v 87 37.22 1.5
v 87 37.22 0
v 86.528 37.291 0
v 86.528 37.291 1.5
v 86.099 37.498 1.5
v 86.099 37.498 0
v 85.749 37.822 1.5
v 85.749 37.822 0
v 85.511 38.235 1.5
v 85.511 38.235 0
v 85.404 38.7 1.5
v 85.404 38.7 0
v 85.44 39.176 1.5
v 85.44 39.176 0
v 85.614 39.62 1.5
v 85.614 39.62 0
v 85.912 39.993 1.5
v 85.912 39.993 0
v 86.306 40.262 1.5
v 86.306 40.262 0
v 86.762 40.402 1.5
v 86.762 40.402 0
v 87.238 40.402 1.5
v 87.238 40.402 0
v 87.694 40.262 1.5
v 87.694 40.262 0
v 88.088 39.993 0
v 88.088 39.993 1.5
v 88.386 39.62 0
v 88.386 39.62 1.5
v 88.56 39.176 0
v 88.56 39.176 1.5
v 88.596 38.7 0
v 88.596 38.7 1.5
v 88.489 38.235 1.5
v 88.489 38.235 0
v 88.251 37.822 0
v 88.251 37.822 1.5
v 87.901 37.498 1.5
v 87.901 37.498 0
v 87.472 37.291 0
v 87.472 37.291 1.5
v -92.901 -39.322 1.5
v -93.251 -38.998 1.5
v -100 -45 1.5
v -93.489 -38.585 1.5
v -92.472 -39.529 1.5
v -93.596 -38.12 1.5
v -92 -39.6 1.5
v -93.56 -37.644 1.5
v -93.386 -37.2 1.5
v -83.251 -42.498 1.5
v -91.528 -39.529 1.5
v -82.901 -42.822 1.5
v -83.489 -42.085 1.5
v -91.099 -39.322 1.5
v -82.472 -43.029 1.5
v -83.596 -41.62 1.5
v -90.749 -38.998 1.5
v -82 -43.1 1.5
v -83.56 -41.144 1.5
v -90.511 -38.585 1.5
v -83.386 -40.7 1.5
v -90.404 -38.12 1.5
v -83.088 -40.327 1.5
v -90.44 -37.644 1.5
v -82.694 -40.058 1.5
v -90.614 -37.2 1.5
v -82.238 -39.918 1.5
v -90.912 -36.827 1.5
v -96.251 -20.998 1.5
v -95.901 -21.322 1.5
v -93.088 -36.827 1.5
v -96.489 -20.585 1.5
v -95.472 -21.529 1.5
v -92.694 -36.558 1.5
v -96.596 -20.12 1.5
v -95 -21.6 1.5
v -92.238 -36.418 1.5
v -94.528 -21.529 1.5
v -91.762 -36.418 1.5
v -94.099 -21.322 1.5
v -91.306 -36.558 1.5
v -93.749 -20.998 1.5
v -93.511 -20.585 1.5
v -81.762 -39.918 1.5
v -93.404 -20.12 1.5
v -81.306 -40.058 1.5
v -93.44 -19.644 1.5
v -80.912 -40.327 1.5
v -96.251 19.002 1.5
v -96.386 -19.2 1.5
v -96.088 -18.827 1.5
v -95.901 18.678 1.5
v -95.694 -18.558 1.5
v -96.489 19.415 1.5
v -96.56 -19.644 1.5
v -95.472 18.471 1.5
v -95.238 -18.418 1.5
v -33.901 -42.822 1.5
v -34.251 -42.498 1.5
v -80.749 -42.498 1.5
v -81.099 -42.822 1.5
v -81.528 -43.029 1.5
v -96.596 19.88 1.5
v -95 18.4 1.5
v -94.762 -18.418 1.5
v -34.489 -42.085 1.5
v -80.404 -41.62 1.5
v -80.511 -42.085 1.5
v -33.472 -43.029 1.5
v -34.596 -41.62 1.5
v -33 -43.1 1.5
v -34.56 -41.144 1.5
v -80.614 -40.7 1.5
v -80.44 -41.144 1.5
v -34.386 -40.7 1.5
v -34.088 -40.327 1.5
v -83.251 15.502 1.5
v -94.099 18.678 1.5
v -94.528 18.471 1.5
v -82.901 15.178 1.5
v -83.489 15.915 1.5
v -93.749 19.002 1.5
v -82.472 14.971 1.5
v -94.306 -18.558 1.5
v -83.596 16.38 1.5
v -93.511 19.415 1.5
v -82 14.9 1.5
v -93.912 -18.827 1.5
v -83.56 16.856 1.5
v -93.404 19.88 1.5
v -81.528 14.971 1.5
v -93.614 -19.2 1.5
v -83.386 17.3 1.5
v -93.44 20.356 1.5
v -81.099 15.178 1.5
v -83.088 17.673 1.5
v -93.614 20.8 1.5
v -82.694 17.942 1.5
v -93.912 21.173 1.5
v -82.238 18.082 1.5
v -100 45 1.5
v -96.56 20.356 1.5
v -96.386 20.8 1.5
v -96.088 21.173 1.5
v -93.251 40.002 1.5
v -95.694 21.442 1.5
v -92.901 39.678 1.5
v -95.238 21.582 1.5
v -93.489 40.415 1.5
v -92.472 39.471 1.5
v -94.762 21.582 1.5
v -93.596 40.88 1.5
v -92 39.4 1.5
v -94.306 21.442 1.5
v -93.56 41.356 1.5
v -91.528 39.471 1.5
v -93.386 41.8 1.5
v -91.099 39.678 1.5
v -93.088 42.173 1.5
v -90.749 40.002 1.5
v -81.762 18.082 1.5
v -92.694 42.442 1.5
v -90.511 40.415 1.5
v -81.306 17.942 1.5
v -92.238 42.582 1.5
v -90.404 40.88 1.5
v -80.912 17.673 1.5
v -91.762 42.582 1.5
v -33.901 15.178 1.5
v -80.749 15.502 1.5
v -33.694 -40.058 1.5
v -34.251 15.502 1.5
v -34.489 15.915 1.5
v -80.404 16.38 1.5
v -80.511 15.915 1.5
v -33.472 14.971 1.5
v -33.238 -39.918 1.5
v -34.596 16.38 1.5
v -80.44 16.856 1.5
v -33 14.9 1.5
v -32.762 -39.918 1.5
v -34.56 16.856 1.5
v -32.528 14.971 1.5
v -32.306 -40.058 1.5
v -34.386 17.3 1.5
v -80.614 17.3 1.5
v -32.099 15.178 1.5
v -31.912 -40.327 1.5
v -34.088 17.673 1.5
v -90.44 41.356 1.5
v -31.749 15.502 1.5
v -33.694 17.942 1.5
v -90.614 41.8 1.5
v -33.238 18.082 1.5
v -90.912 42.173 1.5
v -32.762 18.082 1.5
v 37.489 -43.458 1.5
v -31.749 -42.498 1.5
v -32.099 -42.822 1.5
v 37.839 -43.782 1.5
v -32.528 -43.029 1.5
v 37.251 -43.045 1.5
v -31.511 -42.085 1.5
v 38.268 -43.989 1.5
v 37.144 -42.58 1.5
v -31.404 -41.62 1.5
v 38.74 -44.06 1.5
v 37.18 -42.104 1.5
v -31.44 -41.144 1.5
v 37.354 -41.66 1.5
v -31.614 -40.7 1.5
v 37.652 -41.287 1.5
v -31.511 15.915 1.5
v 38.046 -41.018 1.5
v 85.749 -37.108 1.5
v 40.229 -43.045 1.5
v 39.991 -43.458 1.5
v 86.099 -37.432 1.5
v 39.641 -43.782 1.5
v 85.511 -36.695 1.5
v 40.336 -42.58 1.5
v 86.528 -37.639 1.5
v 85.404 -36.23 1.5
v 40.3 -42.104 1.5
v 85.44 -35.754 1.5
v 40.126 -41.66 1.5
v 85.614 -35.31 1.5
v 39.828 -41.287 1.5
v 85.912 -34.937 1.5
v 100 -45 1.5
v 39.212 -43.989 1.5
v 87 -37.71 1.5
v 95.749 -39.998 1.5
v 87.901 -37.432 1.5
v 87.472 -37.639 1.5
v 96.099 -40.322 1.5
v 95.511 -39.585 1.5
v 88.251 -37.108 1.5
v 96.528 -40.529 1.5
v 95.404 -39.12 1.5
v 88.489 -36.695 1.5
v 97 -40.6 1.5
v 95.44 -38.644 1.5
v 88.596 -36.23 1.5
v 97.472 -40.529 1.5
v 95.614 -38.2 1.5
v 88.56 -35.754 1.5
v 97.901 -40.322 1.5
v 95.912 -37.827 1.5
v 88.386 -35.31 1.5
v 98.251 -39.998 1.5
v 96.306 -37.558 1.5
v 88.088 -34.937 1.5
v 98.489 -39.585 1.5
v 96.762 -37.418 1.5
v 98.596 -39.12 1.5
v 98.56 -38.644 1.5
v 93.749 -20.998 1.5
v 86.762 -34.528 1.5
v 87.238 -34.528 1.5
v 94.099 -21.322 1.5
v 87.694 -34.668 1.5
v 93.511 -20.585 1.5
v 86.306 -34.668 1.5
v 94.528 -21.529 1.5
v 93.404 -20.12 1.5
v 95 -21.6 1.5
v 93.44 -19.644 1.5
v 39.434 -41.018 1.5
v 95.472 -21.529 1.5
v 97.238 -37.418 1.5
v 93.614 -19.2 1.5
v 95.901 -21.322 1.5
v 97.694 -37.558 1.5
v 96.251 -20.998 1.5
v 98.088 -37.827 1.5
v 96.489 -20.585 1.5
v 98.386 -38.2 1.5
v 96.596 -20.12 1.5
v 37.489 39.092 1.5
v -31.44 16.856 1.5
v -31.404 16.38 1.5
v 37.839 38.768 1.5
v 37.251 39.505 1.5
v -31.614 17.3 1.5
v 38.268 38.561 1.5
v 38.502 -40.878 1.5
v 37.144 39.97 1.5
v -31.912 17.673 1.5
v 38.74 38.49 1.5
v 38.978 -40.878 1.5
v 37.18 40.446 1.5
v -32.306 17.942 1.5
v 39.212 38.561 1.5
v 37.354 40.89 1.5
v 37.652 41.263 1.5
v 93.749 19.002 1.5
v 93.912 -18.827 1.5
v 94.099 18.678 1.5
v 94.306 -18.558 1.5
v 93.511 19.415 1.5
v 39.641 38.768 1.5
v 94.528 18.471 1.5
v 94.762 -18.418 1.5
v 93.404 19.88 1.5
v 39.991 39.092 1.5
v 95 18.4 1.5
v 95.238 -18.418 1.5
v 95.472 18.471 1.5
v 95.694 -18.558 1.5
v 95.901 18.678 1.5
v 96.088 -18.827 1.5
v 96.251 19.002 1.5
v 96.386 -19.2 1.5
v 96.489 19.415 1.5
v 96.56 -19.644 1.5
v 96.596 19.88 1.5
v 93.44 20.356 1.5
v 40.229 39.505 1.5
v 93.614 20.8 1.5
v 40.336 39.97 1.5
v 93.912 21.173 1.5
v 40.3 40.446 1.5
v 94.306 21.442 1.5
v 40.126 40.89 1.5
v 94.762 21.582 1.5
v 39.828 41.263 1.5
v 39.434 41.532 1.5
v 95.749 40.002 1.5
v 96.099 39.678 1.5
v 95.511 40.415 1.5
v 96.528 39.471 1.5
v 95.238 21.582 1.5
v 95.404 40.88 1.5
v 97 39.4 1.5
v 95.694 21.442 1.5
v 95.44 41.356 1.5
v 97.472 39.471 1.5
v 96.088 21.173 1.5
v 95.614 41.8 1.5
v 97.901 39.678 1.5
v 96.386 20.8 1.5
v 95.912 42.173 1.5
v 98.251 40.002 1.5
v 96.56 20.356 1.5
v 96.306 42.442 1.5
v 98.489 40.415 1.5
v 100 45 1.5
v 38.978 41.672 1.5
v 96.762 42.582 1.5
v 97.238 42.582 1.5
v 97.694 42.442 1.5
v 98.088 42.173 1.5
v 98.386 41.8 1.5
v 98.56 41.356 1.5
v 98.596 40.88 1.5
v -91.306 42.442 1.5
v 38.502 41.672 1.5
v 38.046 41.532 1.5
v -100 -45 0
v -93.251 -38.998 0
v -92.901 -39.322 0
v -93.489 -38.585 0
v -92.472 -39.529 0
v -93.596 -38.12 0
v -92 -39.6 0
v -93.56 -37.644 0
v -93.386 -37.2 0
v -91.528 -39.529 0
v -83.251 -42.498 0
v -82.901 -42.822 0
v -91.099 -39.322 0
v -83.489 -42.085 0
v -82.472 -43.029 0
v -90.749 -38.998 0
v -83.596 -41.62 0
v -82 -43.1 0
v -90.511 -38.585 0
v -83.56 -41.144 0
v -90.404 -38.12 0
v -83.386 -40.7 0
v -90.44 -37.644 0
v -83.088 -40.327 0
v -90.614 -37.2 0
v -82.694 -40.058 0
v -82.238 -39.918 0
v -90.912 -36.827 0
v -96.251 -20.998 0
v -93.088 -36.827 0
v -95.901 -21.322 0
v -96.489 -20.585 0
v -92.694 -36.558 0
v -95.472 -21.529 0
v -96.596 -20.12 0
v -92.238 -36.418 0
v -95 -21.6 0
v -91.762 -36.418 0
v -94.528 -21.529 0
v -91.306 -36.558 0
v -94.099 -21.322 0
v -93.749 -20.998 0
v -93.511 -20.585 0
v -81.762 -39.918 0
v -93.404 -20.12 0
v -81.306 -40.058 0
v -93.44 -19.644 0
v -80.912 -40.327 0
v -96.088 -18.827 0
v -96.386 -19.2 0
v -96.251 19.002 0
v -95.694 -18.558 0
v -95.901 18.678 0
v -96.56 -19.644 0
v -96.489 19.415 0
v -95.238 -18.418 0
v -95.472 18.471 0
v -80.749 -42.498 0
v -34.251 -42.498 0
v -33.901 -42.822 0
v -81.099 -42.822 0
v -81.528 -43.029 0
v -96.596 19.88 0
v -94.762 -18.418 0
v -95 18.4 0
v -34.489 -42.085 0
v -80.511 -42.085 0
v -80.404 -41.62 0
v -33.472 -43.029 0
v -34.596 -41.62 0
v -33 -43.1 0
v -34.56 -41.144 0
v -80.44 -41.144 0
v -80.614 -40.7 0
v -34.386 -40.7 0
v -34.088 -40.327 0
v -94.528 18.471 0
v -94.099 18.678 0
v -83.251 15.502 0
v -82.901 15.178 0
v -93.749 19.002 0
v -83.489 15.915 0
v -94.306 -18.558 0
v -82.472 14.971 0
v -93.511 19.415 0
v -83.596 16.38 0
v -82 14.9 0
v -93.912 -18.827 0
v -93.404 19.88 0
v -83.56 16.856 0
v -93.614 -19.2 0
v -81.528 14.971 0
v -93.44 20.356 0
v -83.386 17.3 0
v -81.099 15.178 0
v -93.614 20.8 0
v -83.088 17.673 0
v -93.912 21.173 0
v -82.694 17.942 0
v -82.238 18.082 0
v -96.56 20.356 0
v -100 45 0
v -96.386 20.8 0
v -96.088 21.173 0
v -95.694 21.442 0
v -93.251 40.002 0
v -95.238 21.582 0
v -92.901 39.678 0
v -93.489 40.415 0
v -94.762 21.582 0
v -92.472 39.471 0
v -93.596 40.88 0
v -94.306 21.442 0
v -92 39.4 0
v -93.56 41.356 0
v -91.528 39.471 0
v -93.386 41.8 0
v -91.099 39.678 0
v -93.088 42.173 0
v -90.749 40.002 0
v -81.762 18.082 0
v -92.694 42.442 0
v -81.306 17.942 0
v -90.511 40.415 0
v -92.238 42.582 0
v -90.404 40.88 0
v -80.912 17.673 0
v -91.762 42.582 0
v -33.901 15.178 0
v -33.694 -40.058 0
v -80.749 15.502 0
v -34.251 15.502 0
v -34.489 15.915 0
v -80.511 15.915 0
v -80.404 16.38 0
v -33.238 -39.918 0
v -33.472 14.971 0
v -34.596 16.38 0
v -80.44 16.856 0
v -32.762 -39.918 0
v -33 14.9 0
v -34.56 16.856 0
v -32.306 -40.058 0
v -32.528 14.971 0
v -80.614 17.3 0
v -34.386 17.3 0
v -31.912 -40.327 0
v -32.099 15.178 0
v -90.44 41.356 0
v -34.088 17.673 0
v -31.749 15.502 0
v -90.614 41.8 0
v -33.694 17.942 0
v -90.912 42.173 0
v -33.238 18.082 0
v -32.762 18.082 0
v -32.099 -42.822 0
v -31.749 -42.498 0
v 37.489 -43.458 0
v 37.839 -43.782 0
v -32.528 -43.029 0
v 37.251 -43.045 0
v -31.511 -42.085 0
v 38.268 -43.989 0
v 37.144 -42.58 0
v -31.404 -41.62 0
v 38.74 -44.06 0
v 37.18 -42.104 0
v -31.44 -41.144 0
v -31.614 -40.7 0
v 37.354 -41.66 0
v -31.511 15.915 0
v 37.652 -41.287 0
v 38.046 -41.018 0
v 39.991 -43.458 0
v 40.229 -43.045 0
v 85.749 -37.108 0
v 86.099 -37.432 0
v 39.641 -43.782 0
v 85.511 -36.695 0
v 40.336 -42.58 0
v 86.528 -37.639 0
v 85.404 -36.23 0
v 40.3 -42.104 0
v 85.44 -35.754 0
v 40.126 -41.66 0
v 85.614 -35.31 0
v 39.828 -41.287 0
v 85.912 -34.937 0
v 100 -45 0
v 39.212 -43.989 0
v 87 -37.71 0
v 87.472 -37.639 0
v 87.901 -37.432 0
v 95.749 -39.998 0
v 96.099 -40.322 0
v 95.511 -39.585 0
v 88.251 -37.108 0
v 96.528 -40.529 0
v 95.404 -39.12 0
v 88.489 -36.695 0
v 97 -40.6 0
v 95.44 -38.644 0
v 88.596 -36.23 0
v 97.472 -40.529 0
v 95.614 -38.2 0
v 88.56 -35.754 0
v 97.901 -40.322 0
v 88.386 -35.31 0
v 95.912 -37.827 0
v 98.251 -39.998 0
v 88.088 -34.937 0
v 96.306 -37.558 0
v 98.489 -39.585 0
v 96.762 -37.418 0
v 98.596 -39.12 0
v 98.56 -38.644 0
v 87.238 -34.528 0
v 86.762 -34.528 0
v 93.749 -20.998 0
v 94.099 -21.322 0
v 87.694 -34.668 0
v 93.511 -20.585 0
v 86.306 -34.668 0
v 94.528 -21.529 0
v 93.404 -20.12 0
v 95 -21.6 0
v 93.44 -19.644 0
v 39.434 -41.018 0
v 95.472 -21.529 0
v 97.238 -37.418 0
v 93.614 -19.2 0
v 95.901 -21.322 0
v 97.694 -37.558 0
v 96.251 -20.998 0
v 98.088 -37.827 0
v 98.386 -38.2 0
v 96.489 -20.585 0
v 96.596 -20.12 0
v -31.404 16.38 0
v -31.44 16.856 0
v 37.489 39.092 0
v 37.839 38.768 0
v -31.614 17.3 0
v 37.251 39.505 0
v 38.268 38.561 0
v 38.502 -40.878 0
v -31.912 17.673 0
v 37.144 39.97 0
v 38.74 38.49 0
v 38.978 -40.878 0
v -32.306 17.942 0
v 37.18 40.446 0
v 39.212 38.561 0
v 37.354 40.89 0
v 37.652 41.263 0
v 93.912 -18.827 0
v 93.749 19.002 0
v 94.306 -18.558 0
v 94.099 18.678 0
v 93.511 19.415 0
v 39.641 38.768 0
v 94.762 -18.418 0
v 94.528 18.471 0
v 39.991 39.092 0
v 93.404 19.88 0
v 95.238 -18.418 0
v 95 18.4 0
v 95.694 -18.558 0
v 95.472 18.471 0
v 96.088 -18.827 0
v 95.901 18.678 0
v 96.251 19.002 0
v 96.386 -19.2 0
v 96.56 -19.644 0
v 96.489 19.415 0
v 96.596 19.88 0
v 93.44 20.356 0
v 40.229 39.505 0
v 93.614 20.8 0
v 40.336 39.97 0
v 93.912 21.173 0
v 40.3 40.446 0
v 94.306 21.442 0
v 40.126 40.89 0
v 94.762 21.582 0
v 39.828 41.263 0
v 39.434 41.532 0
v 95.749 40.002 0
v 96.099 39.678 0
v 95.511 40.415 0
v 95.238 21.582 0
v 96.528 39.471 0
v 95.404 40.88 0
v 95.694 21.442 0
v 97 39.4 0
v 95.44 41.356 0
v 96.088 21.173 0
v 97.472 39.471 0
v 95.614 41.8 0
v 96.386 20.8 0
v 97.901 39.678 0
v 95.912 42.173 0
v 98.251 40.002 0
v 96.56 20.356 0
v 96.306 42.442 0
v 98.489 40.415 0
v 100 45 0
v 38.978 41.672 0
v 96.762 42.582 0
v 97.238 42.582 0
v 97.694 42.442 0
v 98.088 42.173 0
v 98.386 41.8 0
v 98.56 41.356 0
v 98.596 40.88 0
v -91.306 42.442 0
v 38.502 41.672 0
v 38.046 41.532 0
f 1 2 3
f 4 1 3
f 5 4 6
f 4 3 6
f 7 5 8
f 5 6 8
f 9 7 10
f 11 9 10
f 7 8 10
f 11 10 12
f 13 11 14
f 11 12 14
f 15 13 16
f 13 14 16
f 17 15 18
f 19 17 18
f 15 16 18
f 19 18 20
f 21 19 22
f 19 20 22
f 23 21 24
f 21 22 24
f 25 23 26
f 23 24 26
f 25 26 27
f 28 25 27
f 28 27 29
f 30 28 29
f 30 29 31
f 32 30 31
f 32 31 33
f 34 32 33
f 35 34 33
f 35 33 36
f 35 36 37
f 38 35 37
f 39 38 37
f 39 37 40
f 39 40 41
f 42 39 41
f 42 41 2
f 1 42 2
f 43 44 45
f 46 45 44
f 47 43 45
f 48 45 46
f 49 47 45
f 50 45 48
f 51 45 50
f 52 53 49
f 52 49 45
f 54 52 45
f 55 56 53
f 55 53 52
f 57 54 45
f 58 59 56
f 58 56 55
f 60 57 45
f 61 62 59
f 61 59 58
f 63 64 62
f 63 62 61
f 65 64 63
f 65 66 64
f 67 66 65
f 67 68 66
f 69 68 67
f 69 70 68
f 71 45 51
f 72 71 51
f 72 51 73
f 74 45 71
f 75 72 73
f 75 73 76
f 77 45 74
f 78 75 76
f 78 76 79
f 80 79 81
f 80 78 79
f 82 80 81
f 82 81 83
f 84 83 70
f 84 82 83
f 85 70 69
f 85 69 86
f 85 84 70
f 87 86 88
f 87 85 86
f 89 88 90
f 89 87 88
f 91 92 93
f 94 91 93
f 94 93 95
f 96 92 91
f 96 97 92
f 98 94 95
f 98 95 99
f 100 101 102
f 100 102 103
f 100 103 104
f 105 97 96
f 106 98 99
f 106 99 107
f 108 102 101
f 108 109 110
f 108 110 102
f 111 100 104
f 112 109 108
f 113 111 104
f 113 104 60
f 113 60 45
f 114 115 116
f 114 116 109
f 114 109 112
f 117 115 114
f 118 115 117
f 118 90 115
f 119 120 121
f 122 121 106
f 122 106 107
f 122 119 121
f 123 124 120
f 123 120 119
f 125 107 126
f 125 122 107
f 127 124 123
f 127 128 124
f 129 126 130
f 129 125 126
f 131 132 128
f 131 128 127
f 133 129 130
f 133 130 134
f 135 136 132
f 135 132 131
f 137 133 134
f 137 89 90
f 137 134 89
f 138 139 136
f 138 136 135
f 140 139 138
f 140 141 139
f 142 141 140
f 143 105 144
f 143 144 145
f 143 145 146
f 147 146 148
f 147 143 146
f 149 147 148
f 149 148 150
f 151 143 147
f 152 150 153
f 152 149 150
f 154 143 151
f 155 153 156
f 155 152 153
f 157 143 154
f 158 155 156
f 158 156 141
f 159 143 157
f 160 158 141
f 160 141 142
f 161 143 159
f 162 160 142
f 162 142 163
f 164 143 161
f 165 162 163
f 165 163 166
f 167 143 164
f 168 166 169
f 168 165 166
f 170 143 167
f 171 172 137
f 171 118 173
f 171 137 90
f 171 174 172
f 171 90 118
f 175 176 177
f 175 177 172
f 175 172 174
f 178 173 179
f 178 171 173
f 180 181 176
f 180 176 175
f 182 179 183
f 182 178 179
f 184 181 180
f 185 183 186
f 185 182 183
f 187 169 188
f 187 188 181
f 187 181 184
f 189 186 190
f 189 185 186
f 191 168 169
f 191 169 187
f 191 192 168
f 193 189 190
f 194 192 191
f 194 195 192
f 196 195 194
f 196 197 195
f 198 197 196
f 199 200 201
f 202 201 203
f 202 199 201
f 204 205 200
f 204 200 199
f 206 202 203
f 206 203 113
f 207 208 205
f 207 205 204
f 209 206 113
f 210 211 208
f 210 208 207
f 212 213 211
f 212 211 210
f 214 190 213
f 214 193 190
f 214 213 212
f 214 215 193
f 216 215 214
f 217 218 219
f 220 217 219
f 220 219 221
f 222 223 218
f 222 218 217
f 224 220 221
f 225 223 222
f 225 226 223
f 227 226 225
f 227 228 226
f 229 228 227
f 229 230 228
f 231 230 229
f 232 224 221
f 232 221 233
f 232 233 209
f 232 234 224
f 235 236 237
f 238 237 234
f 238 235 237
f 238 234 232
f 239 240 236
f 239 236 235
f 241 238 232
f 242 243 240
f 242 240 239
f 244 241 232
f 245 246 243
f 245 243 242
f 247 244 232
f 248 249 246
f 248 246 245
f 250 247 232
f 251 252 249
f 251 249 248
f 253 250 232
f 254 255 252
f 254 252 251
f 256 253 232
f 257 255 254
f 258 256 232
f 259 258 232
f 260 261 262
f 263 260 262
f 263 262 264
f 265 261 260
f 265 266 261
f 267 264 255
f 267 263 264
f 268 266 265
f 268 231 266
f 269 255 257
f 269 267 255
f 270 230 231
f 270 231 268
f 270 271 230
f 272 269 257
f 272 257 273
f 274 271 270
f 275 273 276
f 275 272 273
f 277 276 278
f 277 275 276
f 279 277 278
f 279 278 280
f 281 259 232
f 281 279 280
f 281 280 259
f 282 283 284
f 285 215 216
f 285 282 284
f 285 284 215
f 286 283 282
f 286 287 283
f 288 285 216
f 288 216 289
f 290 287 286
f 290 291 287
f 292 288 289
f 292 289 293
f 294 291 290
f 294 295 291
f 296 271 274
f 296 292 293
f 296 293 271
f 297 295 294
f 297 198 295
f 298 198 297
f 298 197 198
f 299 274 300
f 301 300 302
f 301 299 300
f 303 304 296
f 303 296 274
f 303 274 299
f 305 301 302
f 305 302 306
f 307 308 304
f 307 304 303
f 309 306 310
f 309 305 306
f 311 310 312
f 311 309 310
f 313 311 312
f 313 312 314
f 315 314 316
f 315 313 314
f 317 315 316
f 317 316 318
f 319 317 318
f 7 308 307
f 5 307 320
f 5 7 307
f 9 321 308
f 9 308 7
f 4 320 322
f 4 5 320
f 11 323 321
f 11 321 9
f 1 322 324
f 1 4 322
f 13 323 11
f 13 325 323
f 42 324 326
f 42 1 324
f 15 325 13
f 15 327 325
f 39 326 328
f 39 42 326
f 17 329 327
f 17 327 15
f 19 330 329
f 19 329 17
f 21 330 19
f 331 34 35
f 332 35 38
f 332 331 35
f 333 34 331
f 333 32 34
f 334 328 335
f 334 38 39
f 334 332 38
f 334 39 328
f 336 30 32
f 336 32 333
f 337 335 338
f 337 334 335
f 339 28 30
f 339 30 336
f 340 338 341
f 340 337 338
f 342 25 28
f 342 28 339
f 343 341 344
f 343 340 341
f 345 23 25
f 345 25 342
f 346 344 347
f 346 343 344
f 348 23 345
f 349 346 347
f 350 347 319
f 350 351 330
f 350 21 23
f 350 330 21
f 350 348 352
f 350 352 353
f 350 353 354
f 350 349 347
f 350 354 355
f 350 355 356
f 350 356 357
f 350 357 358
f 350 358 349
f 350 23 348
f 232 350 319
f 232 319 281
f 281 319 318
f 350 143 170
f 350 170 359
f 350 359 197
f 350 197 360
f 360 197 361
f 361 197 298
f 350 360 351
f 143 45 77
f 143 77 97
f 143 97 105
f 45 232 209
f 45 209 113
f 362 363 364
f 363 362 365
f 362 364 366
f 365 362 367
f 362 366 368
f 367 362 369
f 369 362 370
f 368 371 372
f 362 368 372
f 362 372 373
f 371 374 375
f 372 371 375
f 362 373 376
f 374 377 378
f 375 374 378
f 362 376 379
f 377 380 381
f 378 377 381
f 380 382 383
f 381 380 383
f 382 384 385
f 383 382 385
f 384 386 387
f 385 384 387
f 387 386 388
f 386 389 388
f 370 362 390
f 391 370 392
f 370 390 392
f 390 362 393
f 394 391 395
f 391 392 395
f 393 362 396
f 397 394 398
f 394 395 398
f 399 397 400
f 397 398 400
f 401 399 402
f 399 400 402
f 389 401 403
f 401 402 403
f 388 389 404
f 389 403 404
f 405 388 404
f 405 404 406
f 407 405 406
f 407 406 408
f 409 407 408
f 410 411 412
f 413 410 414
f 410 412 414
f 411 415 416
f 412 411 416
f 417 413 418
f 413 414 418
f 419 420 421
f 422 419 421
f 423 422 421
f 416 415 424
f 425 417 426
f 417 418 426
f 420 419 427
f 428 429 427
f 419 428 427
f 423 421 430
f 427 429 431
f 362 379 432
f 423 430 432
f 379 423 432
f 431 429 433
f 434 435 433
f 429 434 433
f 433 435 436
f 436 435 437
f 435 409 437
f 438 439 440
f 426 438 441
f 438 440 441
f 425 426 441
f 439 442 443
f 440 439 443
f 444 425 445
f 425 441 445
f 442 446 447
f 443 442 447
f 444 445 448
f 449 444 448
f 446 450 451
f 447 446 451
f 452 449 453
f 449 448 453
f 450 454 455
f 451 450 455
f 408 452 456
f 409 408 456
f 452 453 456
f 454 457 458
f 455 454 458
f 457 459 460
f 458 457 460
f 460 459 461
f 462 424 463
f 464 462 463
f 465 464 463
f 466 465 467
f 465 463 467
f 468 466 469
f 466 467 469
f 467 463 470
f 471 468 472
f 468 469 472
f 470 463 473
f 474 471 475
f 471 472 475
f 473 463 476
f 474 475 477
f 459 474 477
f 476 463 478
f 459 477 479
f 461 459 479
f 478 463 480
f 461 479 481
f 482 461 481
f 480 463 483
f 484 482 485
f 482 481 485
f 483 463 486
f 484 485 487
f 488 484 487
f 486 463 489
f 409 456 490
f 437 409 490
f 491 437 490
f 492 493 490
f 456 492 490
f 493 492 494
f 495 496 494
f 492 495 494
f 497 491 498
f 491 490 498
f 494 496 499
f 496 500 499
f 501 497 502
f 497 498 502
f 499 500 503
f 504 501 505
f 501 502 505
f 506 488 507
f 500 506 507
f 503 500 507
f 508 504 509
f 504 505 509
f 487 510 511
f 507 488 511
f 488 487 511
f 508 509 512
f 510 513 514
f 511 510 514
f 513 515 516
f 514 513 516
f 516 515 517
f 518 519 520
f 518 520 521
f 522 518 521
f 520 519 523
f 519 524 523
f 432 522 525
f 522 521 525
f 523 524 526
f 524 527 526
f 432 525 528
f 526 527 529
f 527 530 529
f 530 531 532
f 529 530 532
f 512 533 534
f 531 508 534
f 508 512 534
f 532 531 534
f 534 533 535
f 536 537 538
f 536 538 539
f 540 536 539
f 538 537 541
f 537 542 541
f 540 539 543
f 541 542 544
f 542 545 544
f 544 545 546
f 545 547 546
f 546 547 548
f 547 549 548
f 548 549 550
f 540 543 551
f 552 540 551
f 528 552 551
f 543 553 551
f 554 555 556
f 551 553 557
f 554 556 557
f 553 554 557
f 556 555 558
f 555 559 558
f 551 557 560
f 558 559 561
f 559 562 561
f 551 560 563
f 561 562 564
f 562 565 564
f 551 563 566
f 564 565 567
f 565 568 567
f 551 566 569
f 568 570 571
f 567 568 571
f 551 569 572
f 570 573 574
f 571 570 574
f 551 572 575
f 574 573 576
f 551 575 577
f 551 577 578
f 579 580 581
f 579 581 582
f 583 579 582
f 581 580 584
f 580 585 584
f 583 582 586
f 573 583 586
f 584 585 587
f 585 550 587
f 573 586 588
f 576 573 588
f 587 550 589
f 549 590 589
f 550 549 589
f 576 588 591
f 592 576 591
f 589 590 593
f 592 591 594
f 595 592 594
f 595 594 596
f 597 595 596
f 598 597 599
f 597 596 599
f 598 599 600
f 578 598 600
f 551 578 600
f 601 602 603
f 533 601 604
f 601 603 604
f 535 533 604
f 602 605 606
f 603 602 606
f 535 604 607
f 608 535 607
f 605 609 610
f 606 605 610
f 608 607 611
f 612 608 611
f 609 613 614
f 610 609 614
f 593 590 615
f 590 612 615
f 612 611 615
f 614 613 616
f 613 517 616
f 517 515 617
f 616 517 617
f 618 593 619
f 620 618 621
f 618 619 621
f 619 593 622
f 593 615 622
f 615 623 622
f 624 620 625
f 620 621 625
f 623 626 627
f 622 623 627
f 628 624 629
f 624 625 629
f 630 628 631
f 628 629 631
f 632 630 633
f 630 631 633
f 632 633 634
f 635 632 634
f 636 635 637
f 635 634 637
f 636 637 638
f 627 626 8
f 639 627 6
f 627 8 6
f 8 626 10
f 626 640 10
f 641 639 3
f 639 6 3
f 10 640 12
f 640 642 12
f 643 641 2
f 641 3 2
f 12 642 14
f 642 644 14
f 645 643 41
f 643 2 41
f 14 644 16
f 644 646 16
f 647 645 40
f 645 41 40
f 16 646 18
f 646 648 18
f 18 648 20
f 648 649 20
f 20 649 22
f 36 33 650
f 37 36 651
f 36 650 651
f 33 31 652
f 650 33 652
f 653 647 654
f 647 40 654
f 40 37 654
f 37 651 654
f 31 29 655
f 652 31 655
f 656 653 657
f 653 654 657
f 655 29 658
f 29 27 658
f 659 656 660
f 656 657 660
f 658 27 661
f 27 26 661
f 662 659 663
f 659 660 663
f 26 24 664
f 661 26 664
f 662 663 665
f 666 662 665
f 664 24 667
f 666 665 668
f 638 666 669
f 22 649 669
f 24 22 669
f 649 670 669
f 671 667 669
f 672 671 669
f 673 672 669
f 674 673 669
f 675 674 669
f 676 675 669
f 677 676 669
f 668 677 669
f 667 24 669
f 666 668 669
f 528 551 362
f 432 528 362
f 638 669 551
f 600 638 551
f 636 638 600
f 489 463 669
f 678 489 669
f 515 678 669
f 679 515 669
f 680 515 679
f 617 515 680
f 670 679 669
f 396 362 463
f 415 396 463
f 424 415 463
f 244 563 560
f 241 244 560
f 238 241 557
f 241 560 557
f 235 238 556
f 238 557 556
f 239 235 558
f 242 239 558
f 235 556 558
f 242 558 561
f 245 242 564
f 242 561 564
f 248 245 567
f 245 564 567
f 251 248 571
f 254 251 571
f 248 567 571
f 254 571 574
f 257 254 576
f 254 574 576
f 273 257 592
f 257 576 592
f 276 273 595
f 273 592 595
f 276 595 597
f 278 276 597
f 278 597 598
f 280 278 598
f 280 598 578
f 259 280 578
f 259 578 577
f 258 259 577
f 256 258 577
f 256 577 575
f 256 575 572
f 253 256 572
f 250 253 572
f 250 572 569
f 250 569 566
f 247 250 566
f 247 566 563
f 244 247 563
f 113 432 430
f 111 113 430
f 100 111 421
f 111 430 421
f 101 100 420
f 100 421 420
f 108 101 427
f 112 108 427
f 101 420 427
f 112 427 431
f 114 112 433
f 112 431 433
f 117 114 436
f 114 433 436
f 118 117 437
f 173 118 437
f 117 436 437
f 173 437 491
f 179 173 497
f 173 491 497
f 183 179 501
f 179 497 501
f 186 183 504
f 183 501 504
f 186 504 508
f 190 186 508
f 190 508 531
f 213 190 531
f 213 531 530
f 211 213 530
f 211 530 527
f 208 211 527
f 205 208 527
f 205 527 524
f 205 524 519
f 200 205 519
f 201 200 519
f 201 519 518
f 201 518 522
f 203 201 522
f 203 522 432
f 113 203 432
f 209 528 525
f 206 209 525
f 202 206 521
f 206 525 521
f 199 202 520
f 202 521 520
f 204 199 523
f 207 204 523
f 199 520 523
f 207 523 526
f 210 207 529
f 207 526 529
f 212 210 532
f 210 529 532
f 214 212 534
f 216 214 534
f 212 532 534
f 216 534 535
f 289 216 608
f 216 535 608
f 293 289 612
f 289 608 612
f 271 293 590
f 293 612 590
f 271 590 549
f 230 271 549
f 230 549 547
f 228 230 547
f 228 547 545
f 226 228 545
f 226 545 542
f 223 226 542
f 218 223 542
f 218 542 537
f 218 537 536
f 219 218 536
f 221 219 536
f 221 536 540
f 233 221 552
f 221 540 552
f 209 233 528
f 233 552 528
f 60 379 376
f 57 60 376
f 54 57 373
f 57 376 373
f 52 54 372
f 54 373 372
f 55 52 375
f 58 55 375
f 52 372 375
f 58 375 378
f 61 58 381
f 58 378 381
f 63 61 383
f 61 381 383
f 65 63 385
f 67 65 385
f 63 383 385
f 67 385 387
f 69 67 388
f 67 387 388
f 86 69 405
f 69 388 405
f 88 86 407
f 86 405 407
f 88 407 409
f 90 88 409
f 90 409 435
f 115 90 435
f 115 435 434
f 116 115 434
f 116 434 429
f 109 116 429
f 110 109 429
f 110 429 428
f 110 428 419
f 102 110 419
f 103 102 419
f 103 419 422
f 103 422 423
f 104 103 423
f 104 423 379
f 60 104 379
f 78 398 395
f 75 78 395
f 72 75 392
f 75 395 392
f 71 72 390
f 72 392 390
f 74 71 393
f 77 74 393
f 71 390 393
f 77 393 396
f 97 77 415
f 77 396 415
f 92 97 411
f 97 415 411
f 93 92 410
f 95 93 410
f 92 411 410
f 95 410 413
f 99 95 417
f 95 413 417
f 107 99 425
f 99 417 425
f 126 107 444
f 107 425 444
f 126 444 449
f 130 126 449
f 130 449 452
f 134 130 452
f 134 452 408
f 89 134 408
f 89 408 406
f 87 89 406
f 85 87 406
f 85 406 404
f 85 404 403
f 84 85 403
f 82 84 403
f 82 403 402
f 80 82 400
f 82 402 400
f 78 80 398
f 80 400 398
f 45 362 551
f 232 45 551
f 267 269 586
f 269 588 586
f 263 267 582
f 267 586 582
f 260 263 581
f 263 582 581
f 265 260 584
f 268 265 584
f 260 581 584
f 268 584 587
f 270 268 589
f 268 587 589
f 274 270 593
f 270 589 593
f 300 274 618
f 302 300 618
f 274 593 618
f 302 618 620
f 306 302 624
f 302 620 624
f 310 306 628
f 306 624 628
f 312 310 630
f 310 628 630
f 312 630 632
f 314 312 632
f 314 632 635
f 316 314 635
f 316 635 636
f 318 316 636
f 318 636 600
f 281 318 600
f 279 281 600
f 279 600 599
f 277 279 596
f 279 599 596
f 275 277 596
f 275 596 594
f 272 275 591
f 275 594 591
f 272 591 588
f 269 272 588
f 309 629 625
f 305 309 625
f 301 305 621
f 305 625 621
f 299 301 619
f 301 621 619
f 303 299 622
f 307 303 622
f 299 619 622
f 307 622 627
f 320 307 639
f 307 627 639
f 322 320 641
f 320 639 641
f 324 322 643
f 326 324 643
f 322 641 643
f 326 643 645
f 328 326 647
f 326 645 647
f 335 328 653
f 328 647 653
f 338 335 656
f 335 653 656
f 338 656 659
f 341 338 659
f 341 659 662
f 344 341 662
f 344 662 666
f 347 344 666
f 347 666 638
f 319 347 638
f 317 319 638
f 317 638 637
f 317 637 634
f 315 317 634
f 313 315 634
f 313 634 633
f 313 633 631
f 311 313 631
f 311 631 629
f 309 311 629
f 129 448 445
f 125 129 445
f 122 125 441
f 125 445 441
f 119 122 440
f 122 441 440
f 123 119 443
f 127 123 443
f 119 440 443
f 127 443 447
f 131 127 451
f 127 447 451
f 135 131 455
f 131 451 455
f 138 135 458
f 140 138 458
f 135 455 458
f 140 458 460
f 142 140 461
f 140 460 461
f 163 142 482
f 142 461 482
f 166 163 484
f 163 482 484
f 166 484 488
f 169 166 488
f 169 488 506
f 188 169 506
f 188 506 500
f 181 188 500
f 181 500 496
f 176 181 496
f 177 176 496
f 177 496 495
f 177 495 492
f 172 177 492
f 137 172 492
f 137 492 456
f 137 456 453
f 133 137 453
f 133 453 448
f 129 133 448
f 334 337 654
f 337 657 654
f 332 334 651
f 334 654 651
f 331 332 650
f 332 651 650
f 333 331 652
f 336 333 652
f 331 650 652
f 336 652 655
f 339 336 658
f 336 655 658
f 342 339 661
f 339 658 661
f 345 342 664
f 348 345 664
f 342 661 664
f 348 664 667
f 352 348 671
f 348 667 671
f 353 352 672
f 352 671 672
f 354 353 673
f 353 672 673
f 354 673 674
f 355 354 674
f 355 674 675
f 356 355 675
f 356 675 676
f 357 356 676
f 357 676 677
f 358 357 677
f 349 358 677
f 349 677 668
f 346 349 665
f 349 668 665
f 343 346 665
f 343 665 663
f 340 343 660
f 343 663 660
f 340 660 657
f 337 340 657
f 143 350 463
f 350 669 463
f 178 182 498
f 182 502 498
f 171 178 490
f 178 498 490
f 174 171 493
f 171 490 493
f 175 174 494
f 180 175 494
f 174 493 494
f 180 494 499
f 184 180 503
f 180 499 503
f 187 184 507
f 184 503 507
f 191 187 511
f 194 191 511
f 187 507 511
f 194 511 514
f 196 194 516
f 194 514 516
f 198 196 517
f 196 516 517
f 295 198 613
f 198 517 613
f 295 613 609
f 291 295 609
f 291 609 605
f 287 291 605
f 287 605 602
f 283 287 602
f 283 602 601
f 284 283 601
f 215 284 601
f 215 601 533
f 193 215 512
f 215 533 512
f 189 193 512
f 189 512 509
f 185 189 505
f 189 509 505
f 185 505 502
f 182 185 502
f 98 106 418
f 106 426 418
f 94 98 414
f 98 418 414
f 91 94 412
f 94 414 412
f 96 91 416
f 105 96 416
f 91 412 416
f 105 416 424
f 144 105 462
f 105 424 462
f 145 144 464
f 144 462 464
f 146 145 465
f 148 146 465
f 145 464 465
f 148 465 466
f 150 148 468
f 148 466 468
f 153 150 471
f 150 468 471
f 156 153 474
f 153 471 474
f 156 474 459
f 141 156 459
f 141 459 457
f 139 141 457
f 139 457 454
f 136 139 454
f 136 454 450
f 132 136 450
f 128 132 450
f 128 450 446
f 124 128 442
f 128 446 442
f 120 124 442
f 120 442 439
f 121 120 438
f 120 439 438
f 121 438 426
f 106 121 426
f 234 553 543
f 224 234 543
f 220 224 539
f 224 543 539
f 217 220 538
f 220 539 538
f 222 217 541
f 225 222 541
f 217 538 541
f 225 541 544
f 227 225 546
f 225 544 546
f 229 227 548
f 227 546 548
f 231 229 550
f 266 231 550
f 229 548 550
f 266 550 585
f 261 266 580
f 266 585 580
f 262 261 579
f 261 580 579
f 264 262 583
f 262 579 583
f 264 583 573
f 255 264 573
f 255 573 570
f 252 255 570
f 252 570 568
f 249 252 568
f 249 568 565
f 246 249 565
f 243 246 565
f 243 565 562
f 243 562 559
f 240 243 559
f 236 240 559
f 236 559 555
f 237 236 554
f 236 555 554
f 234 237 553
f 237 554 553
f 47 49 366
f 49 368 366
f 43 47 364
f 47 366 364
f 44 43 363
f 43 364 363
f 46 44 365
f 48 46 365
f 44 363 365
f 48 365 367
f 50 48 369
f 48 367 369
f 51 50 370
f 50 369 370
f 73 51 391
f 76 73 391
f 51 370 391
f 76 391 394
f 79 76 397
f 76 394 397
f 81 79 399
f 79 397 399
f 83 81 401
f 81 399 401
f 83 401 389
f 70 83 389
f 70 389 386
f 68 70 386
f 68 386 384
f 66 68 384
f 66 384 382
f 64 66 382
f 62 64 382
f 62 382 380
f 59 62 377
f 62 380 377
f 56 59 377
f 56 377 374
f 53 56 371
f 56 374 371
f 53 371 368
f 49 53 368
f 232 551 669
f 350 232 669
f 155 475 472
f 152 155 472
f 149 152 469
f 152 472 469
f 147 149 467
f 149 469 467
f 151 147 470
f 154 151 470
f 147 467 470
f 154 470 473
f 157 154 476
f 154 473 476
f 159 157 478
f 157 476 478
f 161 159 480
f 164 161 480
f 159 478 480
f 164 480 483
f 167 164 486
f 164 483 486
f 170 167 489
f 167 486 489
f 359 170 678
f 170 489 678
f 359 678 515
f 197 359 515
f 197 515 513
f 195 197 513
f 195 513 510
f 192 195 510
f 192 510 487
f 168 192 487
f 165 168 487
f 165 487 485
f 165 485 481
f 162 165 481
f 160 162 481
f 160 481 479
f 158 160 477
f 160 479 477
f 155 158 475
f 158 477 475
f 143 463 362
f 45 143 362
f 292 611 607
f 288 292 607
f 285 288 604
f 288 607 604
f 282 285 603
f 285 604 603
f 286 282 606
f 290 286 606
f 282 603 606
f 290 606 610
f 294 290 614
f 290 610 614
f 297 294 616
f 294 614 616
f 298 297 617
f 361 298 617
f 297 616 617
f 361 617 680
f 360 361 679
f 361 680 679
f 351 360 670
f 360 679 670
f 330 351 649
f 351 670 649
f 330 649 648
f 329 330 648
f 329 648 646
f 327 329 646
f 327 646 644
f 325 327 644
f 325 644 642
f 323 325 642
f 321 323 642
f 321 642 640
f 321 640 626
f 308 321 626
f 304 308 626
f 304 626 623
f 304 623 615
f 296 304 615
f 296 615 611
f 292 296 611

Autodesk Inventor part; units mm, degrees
ref_plane "YZ Plane" through (0, 0, 0) normal (1, 0, 0) x (0, 1, 0)
ref_plane "XZ Plane" through (0, 0, 0) normal (0, 1, 0) x (-1, 0, 0)
ref_plane "XY Plane" through (0, 0, 0) normal (0, 0, 1) x (1, 0, 0)
sketch "スケッチ1" plane through (0, 0, 0) normal (0, 0, 1) x (1, 0, 0)
  line L0 (-100, -45) -> (100, -45)
  line L1 (100, -45) -> (100, 45)
  line L2 (100, 45) -> (-100, 45)
  line L3 (-100, 45) -> (-100, -45)
  line L4 (-100, -45) -> (100, 45) construction
  line L5 (100, -45) -> (-100, 45) construction
  point P0 (0, 0)
  dimension "d0" = 200
  dimension "d1" = 90
extrude "押し出し1" add sketch "スケッチ1" along normal blind 1.5
sketch "スケッチ2" plane through (0, 0, 1.5) normal (0, 0, 1) x (1, 0, 0)
  line L0 (100, -45) -> (100, 45) projected
  line L1 (-100, -45) -> (100, -45) projected
  point P0 (0, 0)
  point P1 (97, 41)
  point P2 (97, -39)
  dimension "d4" = 3
  dimension "d5" = 3
  dimension "d6" = 6
  dimension "d7" = 86
hole "穴1" at (97, 41, 1.5) at (97, -39, 1.5) direction (0, 0, -1) diameter 3.2 depth 8.8 tip angle 118
sketch "スケッチ3" plane through (0, 0, 1.5) normal (0, 0, 1) x (1, 0, 0)
  line L0 (-100, 45) -> (-100, -45) projected
  line L1 (-100, -45) -> (100, -45) projected
  point P0 (0, 0)
  point P1 (-92, 41)
  point P2 (-92, -38)
  dimension "d15" = 8
  dimension "d16" = 8
  dimension "d17" = 7
  dimension "d18" = 86
hole "穴2" at (-92, 41, 1.5) at (-92, -38, 1.5) direction (0, 0, -1) diameter 3.2 depth 8.8 tip angle 118
sketch "スケッチ4" plane through (0, 0, 1.5) normal (0, 0, 1) x (1, 0, 0)
  circle A0 centre (97, -39) radius 1.6 projected
  line L0 (-100, -45) -> (100, -45) projected
  line L1 (100, -45) -> (100, 45) projected
  circle A1 centre (97, 41) radius 1.6 projected
  point P0 (0, 0)
  point P1 (87, 38.82)
  point P2 (87, -36.11)
  dimension "d26" = 10
  dimension "d27" = 8.89
  dimension "d29" = 74.93
  dimension "d41" = 10
hole "穴3" at (87, 38.82, 1.5) at (87, -36.11, 1.5) direction (0, 0, -1) diameter 3.2 depth 8.8 tip angle 118
sketch "スケッチ10" plane through (0, 0, 1.5) normal (0, 0, 1) x (1, 0, 0)
  circle A0 centre (87, -36.11) radius 1.6 projected
  line L0 (-100, -45) -> (100, -45) projected
  circle A1 centre (87, 38.82) radius 1.6 projected
  point P0 (0, 0)
  point P1 (38.74, 40.09)
  point P2 (38.74, -42.46)
  dimension "d43" = 2.54
  dimension "d44" = 48.26
  dimension "d46" = 82.55
hole "穴4" at (38.74, 40.09, 1.5) at (38.74, -42.46, 1.5) direction (0, 0, -1) diameter 3.2 depth 8.8 tip angle 118
sketch "スケッチ11" plane through (0, 0, 1.5) normal (0, 0, 1) x (1, 0, 0)
  line L0 (-100, -45) -> (100, -45) projected
  circle A0 centre (-92, -38) radius 1.6 projected
  point P0 (0, 0)
  point P1 (-82, 16.5)
  point P2 (-33, 16.5)
  point P3 (-33, -41.5)
  point P4 (-82, -41.5)
  dimension "d54" = 3.5
  dimension "d55" = 3.5
  dimension "d56" = 10
  dimension "d57" = 49
  dimension "d58" = 10
  dimension "d59" = 58
  dimension "d60" = 58
  dimension "d61" = 49
hole "穴5" at (-82, 16.5, 1.5) at (-33, 16.5, 1.5) at (-33, -41.5, 1.5) at (-82, -41.5, 1.5) direction (0, 0, -1) diameter 3.2 depth 8.8 tip angle 118
sketch "スケッチ12" plane through (0, 0, 1.5) normal (0, 0, 1) x (1, 0, 0)
  line L0 (-100, 45) -> (-100, -45) projected
  line L1 (100, 45) -> (-100, 45) projected
  line L2 (-100, -45) -> (100, -45) projected
  line L3 (100, -45) -> (100, 45) projected
  point P0 (0, 0)
  point P1 (-95, 20)
  point P2 (-95, -20)
  point P3 (95, 20)
  point P4 (95, -20)
  dimension "d69" = 5
  dimension "d70" = 25
  dimension "d71" = 5
  dimension "d72" = 25
  dimension "d73" = 5
  dimension "d74" = 5
hole "穴6" at (-95, 20, 1.5) at (-95, -20, 1.5) at (95, 20, 1.5) at (95, -20, 1.5) direction (0, 0, -1) diameter 3.2 depth 8.8 tip angle 118
properties part number "20220624_知能ロボット2階部分"
